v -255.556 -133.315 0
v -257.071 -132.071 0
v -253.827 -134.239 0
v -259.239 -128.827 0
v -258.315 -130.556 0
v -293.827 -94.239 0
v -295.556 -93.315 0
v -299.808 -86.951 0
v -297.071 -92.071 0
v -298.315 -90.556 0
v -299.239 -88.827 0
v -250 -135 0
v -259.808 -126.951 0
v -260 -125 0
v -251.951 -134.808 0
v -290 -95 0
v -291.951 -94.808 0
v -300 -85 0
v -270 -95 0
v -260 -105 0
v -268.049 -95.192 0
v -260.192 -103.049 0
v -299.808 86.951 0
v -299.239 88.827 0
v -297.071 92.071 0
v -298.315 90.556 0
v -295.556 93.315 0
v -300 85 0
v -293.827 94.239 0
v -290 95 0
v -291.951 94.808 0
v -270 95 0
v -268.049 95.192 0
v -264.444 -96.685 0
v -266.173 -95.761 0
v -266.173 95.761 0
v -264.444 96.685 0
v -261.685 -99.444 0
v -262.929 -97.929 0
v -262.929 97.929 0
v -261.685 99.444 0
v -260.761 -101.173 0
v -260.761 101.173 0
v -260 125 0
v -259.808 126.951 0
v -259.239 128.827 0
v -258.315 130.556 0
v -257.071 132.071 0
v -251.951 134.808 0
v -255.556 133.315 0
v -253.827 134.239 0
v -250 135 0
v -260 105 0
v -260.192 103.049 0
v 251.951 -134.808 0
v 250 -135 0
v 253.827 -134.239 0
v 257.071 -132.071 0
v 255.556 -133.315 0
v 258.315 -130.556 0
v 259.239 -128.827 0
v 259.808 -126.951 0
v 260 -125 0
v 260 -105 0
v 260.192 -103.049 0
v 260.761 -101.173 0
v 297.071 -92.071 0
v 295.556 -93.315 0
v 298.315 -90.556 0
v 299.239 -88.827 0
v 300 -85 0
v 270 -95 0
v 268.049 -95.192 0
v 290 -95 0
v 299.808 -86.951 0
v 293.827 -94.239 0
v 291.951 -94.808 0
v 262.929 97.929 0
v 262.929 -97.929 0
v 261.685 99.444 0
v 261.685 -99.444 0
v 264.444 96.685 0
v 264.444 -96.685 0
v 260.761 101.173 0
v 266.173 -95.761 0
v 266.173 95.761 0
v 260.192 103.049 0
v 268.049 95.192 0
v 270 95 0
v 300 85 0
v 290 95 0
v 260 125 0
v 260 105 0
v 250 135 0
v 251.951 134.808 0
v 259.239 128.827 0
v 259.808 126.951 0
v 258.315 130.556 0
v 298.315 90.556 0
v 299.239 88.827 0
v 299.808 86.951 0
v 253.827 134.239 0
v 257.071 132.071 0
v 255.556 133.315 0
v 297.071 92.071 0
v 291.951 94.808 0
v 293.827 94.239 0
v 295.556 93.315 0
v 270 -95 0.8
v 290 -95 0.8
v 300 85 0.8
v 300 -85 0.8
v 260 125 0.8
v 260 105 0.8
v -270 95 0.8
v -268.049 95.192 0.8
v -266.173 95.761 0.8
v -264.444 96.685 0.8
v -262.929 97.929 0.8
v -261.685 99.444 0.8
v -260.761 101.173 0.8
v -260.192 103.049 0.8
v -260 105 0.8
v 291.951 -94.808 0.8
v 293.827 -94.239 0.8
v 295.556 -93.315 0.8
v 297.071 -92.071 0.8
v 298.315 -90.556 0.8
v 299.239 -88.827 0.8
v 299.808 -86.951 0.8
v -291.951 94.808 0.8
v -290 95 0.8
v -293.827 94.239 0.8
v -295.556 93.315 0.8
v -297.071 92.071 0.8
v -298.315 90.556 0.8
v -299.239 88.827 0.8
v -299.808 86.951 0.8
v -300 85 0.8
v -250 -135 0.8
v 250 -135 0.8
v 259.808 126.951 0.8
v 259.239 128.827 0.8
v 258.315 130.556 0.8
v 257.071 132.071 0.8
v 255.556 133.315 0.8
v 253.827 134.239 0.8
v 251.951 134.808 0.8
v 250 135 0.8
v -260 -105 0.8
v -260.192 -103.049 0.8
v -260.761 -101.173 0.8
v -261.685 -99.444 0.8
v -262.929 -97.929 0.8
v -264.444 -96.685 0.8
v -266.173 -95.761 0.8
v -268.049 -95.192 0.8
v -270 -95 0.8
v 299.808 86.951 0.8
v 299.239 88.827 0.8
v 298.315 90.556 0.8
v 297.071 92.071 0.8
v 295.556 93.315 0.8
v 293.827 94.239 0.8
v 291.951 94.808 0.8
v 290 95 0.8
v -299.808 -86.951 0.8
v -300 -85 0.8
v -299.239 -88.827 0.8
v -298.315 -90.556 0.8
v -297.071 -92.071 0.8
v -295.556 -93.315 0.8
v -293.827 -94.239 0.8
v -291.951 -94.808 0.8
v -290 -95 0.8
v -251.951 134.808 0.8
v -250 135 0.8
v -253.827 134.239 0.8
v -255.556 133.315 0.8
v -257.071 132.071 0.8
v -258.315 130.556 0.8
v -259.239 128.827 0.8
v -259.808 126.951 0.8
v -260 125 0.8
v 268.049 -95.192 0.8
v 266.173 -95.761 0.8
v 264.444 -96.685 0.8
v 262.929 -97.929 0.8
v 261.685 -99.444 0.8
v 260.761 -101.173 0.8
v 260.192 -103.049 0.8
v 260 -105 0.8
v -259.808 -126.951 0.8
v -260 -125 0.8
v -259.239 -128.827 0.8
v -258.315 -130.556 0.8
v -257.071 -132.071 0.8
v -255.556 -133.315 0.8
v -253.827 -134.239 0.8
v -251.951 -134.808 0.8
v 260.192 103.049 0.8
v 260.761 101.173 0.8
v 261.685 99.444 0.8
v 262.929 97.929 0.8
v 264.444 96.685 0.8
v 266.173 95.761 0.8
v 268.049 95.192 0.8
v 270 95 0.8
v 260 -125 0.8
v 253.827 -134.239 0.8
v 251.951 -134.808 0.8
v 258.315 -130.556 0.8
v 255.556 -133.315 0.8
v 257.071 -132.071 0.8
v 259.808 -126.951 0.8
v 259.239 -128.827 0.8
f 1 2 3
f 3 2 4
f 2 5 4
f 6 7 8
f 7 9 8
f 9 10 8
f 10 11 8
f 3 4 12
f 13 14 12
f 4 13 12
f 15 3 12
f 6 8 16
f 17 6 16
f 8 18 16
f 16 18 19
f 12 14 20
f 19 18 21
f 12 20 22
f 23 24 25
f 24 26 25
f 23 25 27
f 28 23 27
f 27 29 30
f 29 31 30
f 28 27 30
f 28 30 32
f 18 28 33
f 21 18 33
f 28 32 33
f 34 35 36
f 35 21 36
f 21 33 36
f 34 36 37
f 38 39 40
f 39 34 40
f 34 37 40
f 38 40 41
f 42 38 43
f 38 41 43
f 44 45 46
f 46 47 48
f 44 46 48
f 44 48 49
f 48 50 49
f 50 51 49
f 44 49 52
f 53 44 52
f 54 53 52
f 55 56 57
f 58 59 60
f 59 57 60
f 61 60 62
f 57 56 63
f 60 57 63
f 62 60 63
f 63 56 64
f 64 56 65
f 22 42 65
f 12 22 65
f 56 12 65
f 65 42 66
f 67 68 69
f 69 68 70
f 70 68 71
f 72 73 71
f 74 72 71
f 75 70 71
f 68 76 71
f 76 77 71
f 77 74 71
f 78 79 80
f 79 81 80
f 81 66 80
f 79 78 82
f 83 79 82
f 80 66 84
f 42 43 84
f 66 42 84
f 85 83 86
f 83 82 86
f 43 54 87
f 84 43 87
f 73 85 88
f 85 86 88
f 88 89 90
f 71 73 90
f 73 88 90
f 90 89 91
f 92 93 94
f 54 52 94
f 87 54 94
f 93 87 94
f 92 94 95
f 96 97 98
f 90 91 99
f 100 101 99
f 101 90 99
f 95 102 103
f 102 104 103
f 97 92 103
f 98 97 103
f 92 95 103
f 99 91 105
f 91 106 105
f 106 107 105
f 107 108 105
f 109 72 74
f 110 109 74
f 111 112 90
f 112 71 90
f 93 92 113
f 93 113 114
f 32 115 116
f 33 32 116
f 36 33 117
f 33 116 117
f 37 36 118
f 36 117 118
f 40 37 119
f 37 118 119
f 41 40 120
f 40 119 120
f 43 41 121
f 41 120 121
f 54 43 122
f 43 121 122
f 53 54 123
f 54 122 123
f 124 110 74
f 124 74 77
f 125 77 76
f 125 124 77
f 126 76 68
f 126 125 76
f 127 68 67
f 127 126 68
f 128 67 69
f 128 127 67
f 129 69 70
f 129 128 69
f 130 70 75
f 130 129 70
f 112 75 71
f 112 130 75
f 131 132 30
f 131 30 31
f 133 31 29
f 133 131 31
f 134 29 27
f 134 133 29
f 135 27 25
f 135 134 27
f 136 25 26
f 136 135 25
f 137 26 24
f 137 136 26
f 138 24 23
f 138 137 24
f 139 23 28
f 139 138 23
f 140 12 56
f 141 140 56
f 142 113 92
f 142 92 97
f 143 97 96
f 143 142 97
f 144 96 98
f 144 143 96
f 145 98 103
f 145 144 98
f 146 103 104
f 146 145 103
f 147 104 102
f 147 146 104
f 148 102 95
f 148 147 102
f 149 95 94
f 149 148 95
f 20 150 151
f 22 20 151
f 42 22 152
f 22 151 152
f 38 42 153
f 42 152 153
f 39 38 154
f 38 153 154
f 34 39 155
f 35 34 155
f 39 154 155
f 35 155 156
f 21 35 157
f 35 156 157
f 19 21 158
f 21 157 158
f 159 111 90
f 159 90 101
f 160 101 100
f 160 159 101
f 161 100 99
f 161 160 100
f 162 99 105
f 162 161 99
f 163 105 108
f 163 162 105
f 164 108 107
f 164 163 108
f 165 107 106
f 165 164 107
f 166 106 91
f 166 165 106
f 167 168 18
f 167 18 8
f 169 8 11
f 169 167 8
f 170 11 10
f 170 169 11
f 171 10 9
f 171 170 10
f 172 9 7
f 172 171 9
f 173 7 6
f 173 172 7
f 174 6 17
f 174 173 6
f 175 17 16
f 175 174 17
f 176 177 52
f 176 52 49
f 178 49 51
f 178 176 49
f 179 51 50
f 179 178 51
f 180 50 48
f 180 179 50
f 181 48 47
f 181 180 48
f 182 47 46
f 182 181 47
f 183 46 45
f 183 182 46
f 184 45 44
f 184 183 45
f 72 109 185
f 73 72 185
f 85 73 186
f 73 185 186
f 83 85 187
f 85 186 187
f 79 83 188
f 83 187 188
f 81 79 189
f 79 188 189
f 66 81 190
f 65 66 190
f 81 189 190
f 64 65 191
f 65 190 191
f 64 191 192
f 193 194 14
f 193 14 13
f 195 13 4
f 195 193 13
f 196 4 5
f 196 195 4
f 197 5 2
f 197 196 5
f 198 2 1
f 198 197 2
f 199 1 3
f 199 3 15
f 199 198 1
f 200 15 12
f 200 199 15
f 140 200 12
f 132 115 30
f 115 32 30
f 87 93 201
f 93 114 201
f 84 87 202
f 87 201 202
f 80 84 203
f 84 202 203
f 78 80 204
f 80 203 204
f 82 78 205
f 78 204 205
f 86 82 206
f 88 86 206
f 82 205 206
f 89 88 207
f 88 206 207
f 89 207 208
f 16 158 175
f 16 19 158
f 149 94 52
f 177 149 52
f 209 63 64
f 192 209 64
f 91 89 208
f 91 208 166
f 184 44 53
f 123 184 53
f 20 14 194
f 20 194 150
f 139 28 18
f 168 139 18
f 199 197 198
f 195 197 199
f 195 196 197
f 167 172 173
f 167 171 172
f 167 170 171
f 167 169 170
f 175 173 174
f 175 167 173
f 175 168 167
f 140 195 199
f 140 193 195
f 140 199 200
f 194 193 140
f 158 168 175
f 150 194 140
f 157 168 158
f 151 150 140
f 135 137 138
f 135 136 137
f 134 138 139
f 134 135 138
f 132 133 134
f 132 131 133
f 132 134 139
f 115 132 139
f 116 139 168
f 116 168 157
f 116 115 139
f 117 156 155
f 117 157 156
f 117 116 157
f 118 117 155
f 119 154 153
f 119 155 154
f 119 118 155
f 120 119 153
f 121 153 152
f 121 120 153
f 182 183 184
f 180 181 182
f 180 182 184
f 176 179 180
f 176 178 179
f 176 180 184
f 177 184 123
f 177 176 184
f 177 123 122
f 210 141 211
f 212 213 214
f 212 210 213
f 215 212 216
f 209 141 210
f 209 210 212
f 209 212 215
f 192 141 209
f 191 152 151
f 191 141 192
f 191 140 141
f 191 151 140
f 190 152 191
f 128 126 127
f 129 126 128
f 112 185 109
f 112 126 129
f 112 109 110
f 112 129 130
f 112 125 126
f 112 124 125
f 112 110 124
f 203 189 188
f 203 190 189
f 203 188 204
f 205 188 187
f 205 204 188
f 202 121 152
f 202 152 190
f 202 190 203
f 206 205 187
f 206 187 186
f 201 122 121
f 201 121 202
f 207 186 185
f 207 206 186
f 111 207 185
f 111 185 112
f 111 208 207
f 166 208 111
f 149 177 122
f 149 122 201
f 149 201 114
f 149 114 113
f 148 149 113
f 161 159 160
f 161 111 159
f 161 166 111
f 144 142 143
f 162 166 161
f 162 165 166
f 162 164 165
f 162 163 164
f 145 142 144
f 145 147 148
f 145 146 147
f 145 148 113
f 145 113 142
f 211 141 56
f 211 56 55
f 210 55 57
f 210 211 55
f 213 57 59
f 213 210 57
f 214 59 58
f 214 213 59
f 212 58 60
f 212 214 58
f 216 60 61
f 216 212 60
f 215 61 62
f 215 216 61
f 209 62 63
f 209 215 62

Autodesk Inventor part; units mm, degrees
ref_plane "YZ Plane" through (0, 0, 0) normal (1, 0, 0) x (0, 1, 0)
ref_plane "XZ Plane" through (0, 0, 0) normal (0, 1, 0) x (-1, 0, 0)
ref_plane "XY Plane" through (0, 0, 0) normal (0, 0, 1) x (1, 0, 0)
sketch "Sketch1" plane through (0, 0, 0) normal (0, 0, 1) x (1, 0, 0)
  line L0 (-300, -135) -> (300, -135)
  line L1 (300, -135) -> (300, 135)
  line L2 (300, 135) -> (-300, 135)
  line L3 (-300, 135) -> (-300, -135)
  line L4 (-300, -135) -> (300, 135) construction
  line L5 (300, -135) -> (-300, 135) construction
  line L6 (-300, 135) -> (-260, 135)
  line L7 (-260, 135) -> (-260, 95)
  line L8 (-260, 95) -> (-300, 95)
  line L9 (-300, 95) -> (-300, 135)
  line L10 (300, 135) -> (260, 135)
  line L11 (260, 135) -> (260, 95)
  line L12 (260, 95) -> (300, 95)
  line L13 (300, 95) -> (300, 135)
  line L14 (-300, -135) -> (-260, -135)
  line L15 (-260, -135) -> (-260, -95)
  line L16 (-260, -95) -> (-300, -95)
  line L17 (-300, -95) -> (-300, -135)
  line L18 (300, -135) -> (260, -135)
  line L19 (260, -135) -> (260, -95)
  line L20 (260, -95) -> (300, -95)
  line L21 (300, -95) -> (300, -135)
  line L22 (-280, 95) -> (-280, -95) construction
  line L23 (-260, -115) -> (260, -115) construction
  line L24 (280, -95) -> (280, 95) construction
  line L25 (-260, 115) -> (260, 115) construction
  point P0 (0, 0)
  point P1 (300, -95)
  point P2 (300, 95)
  point P3 (-260, 135)
  point P4 (-300, -95)
  dimension "d0" = 600
  dimension "d1" = 270
  dimension "d2" = 40
  dimension "d3" = 40
  dimension "d4" = 40
  dimension "d5" = 40
  dimension "d6" = 40
  dimension "d7" = 40
  dimension "d8" = 40
  dimension "d9" = 40
extrude "Extrusion1" add sketch "Sketch1" along normal blind 0.8 contours L15 L16 L3 L8 L7 L2 L11 L12 L1 L20 L19 L0
fillet "Fillet1" radius 10 12 edges at (-300, 95, 0.4) (-260, 95, 0.4) (-260, 135, 0.4) (260, 95, 0.4) (260, 135, 0.4) (300, 95, 0.4) (260, -135, 0.4) (260, -95, 0.4) (300, -95, 0.4) (-260, -95, 0.4) (-260, -135, 0.4) (-300, -95, 0.4)
properties part number "RT_FRM_MC_015_BottomCover"
